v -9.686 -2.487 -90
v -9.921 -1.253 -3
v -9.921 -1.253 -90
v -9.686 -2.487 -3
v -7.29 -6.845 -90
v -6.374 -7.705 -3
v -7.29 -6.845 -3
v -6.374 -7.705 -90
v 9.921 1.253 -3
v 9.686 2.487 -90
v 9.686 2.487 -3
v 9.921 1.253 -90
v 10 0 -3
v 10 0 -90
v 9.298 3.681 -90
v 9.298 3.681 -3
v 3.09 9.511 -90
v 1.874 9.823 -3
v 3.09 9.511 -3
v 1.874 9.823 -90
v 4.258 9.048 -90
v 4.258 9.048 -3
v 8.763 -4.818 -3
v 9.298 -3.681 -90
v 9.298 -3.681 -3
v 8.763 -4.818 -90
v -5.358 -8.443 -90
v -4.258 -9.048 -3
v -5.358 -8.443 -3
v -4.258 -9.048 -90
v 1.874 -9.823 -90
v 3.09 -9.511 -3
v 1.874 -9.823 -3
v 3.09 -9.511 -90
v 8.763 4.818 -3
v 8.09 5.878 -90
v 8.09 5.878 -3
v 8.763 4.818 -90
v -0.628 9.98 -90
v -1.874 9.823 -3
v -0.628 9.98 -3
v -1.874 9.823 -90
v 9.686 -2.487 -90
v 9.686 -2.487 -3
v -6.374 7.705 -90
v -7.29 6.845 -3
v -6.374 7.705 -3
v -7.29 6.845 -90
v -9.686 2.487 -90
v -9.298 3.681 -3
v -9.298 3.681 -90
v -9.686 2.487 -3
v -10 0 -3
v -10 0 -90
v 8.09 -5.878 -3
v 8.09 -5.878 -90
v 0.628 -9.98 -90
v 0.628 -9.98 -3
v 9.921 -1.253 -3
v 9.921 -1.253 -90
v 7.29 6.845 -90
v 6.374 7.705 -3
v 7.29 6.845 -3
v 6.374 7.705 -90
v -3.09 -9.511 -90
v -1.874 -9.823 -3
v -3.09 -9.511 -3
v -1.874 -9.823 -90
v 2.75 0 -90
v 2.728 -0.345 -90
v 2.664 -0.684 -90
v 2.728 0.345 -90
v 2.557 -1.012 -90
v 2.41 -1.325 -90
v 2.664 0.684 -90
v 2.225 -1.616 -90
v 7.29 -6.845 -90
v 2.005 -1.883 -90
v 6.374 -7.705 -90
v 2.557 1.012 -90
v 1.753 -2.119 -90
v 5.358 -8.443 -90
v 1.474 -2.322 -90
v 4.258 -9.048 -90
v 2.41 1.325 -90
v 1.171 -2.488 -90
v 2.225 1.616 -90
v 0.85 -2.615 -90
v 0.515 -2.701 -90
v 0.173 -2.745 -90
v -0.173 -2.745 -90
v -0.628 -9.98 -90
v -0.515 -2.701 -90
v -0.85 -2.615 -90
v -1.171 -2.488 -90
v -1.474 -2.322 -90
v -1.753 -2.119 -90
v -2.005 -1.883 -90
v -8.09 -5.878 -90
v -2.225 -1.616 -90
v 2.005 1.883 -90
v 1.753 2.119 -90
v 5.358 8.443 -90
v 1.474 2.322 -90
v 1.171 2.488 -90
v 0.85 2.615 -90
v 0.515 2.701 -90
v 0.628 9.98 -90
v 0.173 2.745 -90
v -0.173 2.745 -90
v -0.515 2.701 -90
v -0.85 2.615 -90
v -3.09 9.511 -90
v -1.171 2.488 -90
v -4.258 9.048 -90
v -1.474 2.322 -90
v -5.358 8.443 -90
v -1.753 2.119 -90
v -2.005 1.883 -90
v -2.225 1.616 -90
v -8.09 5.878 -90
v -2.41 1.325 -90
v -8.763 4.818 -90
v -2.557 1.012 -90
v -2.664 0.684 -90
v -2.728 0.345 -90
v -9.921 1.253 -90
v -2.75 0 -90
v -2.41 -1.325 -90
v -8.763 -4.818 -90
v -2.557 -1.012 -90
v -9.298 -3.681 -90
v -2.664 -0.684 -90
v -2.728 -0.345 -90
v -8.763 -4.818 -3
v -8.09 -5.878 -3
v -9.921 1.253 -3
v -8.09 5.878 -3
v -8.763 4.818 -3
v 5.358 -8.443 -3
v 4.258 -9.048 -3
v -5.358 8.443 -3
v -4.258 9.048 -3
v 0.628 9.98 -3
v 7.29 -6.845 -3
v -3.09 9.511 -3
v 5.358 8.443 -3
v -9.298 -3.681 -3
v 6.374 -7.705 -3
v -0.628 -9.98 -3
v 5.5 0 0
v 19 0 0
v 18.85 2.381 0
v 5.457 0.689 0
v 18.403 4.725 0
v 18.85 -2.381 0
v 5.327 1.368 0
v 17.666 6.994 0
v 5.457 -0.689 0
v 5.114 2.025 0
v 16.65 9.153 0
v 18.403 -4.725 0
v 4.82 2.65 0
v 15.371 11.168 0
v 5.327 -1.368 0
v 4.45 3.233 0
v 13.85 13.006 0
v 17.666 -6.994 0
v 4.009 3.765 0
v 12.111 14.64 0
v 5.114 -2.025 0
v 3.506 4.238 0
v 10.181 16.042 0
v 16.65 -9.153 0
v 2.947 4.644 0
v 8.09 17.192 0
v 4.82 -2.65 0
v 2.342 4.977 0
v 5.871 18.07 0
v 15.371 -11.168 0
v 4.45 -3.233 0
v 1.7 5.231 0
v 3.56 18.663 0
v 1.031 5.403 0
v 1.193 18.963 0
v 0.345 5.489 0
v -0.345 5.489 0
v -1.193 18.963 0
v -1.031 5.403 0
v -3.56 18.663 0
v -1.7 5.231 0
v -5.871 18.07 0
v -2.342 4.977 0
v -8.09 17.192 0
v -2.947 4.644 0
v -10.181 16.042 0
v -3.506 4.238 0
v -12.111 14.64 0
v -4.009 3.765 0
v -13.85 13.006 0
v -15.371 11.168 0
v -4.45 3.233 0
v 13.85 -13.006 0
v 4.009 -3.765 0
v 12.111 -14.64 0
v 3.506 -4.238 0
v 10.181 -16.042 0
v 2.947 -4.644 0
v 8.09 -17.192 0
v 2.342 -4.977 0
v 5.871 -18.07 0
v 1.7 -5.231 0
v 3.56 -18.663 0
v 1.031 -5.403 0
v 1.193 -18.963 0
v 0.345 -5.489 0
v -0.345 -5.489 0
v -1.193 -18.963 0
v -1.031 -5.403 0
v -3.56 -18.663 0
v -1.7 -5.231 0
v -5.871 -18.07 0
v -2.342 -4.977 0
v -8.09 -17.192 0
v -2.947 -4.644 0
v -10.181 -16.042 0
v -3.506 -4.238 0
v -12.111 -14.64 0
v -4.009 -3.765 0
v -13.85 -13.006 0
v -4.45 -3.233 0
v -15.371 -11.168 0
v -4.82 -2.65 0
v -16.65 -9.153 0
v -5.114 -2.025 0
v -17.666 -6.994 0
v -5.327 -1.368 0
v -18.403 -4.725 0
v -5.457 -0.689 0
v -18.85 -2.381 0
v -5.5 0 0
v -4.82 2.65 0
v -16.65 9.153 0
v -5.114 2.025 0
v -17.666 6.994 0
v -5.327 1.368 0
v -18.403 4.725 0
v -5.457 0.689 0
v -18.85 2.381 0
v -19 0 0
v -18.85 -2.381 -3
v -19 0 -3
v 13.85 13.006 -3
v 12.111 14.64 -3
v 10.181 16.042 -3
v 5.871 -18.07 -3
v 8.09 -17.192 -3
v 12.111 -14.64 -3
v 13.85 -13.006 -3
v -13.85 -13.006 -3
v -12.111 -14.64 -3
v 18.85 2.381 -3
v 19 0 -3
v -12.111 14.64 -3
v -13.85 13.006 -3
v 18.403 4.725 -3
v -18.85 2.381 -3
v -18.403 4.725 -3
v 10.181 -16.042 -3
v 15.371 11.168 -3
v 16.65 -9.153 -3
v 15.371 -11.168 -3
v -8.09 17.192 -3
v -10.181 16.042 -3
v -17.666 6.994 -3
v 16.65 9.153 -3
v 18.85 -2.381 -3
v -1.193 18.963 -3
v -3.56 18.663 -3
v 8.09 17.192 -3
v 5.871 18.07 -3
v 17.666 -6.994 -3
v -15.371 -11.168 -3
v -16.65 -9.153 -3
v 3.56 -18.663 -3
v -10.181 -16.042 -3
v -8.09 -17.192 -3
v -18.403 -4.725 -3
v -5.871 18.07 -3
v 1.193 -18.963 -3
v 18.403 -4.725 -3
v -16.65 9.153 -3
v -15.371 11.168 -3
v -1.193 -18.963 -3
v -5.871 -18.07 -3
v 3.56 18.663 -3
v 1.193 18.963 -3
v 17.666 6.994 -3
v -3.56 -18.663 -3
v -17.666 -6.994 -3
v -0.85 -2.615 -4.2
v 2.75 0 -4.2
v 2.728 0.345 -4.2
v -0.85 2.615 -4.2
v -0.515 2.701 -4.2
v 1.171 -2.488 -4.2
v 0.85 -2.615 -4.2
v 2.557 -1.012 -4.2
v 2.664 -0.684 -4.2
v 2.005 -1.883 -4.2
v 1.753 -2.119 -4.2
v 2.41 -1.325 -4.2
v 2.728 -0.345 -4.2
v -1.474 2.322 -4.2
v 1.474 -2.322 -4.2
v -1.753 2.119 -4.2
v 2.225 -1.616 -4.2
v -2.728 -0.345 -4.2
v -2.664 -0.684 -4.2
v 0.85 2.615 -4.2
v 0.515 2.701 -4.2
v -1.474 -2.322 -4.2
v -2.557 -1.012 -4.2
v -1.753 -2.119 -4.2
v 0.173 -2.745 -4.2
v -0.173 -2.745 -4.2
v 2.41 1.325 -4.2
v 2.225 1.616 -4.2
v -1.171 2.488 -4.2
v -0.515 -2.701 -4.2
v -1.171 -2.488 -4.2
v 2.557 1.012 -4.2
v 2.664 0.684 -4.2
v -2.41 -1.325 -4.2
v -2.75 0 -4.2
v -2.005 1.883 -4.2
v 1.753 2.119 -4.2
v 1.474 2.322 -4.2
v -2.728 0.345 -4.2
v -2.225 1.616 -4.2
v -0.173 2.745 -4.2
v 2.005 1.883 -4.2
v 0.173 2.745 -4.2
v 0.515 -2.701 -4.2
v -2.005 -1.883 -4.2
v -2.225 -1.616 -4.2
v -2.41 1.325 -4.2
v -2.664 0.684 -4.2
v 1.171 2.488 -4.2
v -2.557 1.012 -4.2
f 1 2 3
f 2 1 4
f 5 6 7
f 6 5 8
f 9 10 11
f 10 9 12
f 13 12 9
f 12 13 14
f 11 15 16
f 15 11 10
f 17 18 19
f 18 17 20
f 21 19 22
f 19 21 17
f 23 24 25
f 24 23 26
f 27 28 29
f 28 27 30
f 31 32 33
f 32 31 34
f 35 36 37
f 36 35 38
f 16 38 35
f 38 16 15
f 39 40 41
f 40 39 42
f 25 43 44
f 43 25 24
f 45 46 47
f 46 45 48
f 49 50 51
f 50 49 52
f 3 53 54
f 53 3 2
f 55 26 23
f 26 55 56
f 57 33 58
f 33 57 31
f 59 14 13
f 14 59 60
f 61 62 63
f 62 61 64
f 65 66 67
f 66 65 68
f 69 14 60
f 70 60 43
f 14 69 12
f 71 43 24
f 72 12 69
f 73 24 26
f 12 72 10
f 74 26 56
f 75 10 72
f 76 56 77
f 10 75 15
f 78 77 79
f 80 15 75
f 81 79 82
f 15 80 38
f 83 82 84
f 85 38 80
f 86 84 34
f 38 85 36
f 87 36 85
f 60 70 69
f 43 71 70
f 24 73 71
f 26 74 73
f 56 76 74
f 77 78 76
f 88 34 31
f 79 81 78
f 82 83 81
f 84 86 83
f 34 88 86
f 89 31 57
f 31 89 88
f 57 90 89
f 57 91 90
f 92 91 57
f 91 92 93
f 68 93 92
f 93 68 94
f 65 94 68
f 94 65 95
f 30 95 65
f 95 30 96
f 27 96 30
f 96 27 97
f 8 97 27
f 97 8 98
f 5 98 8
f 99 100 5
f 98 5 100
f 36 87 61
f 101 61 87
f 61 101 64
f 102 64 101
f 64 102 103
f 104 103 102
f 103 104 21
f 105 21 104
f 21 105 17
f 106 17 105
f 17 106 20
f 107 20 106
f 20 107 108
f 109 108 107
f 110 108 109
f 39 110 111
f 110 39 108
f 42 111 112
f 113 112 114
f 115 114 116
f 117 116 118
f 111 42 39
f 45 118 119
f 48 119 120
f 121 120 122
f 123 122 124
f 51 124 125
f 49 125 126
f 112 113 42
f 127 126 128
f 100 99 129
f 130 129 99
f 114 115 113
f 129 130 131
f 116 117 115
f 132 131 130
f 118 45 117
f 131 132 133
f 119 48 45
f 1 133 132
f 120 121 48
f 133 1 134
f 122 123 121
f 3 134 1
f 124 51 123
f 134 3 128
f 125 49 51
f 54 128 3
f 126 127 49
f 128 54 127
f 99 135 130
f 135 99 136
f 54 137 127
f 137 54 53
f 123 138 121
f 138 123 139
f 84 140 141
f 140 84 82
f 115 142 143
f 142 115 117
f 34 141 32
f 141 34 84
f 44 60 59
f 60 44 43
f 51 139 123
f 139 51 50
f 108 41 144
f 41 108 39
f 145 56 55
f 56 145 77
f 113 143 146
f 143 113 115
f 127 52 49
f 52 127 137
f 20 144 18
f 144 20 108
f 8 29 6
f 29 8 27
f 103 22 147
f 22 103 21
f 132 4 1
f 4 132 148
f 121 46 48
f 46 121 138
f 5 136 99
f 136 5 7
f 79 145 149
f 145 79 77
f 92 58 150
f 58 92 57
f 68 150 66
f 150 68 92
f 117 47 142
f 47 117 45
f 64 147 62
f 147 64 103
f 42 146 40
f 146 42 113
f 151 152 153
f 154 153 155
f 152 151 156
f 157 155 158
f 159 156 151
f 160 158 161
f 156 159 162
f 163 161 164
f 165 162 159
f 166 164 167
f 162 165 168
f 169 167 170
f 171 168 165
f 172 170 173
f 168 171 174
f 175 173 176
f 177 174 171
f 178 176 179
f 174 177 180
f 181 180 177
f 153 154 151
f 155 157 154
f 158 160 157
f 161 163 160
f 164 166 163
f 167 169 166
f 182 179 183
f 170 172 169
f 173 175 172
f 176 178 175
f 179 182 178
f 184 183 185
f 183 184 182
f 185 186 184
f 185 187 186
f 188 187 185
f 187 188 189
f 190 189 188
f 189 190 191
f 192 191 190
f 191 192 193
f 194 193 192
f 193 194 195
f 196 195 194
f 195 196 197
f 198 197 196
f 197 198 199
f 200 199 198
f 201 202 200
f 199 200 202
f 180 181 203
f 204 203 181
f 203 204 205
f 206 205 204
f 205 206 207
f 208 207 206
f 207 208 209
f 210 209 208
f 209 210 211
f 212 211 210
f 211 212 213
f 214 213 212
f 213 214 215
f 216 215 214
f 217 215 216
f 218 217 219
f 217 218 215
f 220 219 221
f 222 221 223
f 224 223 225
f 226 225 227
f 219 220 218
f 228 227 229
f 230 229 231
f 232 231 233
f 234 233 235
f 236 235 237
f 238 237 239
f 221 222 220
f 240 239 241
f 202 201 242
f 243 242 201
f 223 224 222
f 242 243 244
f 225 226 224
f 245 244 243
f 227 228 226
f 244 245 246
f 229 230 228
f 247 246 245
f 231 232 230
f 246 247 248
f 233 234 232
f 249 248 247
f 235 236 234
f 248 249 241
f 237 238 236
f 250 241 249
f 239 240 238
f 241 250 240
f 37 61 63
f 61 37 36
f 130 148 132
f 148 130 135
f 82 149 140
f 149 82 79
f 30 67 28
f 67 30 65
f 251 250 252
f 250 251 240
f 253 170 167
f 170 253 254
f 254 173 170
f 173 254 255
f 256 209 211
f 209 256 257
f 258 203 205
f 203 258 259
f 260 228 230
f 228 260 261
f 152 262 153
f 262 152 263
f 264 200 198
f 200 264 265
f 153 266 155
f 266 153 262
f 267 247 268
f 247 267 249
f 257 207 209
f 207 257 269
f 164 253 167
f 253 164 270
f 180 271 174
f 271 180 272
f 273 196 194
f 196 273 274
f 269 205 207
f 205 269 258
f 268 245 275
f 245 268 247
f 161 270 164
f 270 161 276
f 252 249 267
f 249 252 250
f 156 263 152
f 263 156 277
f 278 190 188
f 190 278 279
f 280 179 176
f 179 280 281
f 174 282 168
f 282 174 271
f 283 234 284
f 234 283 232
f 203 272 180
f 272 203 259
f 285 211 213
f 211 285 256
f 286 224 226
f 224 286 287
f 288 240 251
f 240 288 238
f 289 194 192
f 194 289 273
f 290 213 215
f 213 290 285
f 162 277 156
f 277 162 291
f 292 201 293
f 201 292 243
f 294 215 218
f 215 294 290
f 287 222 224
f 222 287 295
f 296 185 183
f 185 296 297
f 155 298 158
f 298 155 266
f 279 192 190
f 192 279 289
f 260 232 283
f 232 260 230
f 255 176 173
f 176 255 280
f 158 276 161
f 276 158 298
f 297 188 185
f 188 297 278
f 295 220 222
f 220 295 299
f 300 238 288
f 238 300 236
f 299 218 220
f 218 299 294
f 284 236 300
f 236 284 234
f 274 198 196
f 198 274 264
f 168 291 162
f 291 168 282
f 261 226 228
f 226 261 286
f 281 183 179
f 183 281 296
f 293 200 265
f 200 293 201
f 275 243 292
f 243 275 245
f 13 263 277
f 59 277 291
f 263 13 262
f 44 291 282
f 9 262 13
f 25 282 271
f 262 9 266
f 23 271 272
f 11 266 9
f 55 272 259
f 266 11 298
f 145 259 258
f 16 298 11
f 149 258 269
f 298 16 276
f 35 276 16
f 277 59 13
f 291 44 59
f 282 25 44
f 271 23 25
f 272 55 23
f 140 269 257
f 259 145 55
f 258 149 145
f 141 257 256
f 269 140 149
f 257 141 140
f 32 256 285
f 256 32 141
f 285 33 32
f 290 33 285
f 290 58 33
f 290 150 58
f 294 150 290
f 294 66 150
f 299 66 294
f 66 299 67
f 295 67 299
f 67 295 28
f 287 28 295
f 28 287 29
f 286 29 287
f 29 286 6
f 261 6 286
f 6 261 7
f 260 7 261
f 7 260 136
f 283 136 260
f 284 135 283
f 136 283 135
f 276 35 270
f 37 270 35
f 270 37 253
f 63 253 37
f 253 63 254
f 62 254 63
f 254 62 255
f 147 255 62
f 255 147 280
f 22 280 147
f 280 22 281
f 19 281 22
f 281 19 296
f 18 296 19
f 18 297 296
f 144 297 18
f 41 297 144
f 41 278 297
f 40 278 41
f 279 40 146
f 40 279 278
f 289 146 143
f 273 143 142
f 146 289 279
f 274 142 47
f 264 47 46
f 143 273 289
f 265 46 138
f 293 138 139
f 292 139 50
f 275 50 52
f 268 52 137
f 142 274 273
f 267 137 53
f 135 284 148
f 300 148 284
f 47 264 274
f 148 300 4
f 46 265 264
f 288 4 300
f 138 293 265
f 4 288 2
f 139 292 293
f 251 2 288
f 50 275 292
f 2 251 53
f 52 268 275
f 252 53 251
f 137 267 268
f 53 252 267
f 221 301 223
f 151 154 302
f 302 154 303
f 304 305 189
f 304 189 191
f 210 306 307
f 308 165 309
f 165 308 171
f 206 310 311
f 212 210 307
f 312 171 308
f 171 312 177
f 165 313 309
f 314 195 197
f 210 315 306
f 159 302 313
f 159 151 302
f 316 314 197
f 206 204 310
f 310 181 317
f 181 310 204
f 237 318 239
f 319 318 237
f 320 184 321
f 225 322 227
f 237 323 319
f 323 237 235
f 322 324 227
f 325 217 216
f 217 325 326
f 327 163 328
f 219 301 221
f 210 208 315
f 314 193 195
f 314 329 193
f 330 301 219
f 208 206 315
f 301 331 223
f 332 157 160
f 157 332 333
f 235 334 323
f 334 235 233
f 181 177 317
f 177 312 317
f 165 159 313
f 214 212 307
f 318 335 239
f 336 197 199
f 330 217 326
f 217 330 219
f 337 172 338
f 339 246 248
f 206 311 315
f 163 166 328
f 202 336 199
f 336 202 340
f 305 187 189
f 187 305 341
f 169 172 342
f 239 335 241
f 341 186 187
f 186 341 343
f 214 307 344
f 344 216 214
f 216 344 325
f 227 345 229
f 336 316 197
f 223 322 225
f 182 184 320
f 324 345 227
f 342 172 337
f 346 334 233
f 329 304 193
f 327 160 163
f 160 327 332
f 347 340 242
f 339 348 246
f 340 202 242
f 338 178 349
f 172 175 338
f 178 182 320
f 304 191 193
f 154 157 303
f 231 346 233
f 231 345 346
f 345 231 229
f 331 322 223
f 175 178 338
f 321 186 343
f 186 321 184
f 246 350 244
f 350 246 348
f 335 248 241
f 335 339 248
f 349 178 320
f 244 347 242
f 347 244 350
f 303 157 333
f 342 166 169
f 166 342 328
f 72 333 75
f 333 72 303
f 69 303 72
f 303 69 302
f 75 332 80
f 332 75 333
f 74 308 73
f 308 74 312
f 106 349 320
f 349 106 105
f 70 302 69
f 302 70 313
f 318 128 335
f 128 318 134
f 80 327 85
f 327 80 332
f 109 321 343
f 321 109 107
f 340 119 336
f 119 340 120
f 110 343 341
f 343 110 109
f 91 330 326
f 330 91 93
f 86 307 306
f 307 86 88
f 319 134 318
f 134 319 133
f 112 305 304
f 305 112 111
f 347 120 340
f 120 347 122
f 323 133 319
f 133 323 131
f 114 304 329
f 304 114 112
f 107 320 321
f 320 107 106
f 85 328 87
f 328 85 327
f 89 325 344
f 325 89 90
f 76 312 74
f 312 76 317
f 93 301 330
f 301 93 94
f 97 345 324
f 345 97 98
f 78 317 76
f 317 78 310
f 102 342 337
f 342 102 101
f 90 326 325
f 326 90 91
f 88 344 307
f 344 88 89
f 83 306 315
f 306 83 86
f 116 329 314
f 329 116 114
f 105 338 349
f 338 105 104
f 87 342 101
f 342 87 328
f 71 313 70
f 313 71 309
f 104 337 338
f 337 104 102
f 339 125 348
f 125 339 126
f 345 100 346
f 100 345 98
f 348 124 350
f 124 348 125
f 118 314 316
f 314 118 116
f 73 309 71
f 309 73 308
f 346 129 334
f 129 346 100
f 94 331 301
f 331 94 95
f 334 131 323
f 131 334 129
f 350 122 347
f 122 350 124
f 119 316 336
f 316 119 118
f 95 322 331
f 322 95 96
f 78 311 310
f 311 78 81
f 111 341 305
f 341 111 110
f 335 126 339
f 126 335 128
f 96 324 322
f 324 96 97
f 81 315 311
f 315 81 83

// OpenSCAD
$fn = 50;


difference() {
	union() {
		translate(v = [0, 0, -90.0000000000]) {
			cylinder(h = 90, r = 10.0000000000);
		}
		translate(v = [0, 0, -3.0000000000]) {
			cylinder(h = 3, r = 19.0000000000);
		}
	}
	union() {
		translate(v = [0, 0, 0]) {
			rotate(a = [0, 0, 0]) {
				difference() {
					union() {
						#translate(v = [0, 0, -90.0000000000]) {
							cylinder(h = 90, r = 2.2500000000);
						}
						#translate(v = [0, 0, -4.2000000000]) {
							cylinder(h = 4.2000000000, r1 = 2.7500000000, r2 = 5.5000000000);
						}
						#translate(v = [0, 0, -90.0000000000]) {
							cylinder(h = 90, r = 2.7500000000);
						}
						#translate(v = [0, 0, -90.0000000000]) {
							cylinder(h = 90, r = 2.2500000000);
						}
					}
					union();
				}
			}
		}
	}
}
